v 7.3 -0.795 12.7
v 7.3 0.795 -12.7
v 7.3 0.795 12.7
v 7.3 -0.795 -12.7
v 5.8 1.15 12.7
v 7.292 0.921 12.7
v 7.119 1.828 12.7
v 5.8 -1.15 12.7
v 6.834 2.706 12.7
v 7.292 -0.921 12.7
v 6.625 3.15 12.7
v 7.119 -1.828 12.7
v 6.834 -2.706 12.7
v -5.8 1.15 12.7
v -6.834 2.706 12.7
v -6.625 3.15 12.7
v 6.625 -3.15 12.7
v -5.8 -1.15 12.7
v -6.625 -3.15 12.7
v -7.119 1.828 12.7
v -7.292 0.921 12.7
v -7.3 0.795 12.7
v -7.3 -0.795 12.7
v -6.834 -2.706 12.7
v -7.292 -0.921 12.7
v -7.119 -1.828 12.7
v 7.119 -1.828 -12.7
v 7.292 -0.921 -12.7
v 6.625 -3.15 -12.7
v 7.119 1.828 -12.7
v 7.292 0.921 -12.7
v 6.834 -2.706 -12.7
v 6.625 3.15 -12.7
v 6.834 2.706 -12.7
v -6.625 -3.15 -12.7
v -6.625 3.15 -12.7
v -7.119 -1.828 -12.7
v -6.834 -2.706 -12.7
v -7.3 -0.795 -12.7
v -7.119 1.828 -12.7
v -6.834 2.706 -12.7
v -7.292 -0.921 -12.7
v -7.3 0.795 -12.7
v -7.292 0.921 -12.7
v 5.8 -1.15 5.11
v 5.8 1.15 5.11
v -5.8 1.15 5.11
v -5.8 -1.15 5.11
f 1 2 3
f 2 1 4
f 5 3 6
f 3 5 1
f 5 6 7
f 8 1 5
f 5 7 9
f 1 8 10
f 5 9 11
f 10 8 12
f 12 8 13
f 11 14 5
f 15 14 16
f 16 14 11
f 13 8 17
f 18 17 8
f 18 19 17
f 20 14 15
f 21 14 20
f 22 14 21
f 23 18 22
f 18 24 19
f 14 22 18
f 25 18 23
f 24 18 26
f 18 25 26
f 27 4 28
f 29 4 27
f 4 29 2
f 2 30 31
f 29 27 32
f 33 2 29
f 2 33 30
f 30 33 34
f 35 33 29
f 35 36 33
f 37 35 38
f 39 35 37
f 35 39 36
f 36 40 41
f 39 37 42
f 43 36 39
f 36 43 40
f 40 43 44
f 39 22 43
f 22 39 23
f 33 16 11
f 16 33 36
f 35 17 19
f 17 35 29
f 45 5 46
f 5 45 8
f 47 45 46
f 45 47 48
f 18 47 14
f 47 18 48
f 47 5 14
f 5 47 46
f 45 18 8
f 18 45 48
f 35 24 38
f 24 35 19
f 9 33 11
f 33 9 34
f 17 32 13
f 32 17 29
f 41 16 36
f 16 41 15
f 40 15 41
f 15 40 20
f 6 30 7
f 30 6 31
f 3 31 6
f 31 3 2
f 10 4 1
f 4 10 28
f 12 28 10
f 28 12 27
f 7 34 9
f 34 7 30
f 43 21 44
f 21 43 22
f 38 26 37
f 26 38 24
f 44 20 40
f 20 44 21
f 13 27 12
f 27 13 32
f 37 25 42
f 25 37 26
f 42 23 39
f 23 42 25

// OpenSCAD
$fn = 50*1;

//The total height of this magazine release extension
TOTAL_HEIGHT = 25.4;

//The depth of the pocket that the existing magazine release fits in
POCKET_DEPTH = 7.6;

//The width of the existing magazine release
RELEASE_WIDTH = 11.6;

//The height of the existing magazine release
RELEASE_HEIGHT = 2.3;

//How thick to make the walls (added to the RELEASE_WIDTH)
SIDE_WALL_THICKNESS = 1.5;

//How thick to make the walls (added to the RELEASE_HEIGHT)
TOP_AND_BOTTOM_WALL_THICKNESS = 2;

// Used to make sure that there isn't a "film" 
// of plastic covering the top
TOLERANCE = 0.01 * 1;

// An adjustment to the rounding of corners
ROUNDING_ADJUSTMENT = 0.05 * 1; //


intersection() {
	difference() {
		cube(size = [RELEASE_WIDTH + 2*SIDE_WALL_THICKNESS,
						 RELEASE_HEIGHT + 2*TOP_AND_BOTTOM_WALL_THICKNESS,
						 TOTAL_HEIGHT],
								 center = true);
		translate([0, 0, (TOTAL_HEIGHT - POCKET_DEPTH)/2 + TOLERANCE]){
			cube(size = [RELEASE_WIDTH, RELEASE_HEIGHT, POCKET_DEPTH], center = true);
		}
	}

	//Round the corners slightly
	cylinder(r = max( RELEASE_WIDTH/2 + SIDE_WALL_THICKNESS, RELEASE_HEIGHT/2 + TOP_AND_BOTTOM_WALL_THICKNESS) + ROUNDING_ADJUSTMENT, h = TOTAL_HEIGHT, center = true);

}
